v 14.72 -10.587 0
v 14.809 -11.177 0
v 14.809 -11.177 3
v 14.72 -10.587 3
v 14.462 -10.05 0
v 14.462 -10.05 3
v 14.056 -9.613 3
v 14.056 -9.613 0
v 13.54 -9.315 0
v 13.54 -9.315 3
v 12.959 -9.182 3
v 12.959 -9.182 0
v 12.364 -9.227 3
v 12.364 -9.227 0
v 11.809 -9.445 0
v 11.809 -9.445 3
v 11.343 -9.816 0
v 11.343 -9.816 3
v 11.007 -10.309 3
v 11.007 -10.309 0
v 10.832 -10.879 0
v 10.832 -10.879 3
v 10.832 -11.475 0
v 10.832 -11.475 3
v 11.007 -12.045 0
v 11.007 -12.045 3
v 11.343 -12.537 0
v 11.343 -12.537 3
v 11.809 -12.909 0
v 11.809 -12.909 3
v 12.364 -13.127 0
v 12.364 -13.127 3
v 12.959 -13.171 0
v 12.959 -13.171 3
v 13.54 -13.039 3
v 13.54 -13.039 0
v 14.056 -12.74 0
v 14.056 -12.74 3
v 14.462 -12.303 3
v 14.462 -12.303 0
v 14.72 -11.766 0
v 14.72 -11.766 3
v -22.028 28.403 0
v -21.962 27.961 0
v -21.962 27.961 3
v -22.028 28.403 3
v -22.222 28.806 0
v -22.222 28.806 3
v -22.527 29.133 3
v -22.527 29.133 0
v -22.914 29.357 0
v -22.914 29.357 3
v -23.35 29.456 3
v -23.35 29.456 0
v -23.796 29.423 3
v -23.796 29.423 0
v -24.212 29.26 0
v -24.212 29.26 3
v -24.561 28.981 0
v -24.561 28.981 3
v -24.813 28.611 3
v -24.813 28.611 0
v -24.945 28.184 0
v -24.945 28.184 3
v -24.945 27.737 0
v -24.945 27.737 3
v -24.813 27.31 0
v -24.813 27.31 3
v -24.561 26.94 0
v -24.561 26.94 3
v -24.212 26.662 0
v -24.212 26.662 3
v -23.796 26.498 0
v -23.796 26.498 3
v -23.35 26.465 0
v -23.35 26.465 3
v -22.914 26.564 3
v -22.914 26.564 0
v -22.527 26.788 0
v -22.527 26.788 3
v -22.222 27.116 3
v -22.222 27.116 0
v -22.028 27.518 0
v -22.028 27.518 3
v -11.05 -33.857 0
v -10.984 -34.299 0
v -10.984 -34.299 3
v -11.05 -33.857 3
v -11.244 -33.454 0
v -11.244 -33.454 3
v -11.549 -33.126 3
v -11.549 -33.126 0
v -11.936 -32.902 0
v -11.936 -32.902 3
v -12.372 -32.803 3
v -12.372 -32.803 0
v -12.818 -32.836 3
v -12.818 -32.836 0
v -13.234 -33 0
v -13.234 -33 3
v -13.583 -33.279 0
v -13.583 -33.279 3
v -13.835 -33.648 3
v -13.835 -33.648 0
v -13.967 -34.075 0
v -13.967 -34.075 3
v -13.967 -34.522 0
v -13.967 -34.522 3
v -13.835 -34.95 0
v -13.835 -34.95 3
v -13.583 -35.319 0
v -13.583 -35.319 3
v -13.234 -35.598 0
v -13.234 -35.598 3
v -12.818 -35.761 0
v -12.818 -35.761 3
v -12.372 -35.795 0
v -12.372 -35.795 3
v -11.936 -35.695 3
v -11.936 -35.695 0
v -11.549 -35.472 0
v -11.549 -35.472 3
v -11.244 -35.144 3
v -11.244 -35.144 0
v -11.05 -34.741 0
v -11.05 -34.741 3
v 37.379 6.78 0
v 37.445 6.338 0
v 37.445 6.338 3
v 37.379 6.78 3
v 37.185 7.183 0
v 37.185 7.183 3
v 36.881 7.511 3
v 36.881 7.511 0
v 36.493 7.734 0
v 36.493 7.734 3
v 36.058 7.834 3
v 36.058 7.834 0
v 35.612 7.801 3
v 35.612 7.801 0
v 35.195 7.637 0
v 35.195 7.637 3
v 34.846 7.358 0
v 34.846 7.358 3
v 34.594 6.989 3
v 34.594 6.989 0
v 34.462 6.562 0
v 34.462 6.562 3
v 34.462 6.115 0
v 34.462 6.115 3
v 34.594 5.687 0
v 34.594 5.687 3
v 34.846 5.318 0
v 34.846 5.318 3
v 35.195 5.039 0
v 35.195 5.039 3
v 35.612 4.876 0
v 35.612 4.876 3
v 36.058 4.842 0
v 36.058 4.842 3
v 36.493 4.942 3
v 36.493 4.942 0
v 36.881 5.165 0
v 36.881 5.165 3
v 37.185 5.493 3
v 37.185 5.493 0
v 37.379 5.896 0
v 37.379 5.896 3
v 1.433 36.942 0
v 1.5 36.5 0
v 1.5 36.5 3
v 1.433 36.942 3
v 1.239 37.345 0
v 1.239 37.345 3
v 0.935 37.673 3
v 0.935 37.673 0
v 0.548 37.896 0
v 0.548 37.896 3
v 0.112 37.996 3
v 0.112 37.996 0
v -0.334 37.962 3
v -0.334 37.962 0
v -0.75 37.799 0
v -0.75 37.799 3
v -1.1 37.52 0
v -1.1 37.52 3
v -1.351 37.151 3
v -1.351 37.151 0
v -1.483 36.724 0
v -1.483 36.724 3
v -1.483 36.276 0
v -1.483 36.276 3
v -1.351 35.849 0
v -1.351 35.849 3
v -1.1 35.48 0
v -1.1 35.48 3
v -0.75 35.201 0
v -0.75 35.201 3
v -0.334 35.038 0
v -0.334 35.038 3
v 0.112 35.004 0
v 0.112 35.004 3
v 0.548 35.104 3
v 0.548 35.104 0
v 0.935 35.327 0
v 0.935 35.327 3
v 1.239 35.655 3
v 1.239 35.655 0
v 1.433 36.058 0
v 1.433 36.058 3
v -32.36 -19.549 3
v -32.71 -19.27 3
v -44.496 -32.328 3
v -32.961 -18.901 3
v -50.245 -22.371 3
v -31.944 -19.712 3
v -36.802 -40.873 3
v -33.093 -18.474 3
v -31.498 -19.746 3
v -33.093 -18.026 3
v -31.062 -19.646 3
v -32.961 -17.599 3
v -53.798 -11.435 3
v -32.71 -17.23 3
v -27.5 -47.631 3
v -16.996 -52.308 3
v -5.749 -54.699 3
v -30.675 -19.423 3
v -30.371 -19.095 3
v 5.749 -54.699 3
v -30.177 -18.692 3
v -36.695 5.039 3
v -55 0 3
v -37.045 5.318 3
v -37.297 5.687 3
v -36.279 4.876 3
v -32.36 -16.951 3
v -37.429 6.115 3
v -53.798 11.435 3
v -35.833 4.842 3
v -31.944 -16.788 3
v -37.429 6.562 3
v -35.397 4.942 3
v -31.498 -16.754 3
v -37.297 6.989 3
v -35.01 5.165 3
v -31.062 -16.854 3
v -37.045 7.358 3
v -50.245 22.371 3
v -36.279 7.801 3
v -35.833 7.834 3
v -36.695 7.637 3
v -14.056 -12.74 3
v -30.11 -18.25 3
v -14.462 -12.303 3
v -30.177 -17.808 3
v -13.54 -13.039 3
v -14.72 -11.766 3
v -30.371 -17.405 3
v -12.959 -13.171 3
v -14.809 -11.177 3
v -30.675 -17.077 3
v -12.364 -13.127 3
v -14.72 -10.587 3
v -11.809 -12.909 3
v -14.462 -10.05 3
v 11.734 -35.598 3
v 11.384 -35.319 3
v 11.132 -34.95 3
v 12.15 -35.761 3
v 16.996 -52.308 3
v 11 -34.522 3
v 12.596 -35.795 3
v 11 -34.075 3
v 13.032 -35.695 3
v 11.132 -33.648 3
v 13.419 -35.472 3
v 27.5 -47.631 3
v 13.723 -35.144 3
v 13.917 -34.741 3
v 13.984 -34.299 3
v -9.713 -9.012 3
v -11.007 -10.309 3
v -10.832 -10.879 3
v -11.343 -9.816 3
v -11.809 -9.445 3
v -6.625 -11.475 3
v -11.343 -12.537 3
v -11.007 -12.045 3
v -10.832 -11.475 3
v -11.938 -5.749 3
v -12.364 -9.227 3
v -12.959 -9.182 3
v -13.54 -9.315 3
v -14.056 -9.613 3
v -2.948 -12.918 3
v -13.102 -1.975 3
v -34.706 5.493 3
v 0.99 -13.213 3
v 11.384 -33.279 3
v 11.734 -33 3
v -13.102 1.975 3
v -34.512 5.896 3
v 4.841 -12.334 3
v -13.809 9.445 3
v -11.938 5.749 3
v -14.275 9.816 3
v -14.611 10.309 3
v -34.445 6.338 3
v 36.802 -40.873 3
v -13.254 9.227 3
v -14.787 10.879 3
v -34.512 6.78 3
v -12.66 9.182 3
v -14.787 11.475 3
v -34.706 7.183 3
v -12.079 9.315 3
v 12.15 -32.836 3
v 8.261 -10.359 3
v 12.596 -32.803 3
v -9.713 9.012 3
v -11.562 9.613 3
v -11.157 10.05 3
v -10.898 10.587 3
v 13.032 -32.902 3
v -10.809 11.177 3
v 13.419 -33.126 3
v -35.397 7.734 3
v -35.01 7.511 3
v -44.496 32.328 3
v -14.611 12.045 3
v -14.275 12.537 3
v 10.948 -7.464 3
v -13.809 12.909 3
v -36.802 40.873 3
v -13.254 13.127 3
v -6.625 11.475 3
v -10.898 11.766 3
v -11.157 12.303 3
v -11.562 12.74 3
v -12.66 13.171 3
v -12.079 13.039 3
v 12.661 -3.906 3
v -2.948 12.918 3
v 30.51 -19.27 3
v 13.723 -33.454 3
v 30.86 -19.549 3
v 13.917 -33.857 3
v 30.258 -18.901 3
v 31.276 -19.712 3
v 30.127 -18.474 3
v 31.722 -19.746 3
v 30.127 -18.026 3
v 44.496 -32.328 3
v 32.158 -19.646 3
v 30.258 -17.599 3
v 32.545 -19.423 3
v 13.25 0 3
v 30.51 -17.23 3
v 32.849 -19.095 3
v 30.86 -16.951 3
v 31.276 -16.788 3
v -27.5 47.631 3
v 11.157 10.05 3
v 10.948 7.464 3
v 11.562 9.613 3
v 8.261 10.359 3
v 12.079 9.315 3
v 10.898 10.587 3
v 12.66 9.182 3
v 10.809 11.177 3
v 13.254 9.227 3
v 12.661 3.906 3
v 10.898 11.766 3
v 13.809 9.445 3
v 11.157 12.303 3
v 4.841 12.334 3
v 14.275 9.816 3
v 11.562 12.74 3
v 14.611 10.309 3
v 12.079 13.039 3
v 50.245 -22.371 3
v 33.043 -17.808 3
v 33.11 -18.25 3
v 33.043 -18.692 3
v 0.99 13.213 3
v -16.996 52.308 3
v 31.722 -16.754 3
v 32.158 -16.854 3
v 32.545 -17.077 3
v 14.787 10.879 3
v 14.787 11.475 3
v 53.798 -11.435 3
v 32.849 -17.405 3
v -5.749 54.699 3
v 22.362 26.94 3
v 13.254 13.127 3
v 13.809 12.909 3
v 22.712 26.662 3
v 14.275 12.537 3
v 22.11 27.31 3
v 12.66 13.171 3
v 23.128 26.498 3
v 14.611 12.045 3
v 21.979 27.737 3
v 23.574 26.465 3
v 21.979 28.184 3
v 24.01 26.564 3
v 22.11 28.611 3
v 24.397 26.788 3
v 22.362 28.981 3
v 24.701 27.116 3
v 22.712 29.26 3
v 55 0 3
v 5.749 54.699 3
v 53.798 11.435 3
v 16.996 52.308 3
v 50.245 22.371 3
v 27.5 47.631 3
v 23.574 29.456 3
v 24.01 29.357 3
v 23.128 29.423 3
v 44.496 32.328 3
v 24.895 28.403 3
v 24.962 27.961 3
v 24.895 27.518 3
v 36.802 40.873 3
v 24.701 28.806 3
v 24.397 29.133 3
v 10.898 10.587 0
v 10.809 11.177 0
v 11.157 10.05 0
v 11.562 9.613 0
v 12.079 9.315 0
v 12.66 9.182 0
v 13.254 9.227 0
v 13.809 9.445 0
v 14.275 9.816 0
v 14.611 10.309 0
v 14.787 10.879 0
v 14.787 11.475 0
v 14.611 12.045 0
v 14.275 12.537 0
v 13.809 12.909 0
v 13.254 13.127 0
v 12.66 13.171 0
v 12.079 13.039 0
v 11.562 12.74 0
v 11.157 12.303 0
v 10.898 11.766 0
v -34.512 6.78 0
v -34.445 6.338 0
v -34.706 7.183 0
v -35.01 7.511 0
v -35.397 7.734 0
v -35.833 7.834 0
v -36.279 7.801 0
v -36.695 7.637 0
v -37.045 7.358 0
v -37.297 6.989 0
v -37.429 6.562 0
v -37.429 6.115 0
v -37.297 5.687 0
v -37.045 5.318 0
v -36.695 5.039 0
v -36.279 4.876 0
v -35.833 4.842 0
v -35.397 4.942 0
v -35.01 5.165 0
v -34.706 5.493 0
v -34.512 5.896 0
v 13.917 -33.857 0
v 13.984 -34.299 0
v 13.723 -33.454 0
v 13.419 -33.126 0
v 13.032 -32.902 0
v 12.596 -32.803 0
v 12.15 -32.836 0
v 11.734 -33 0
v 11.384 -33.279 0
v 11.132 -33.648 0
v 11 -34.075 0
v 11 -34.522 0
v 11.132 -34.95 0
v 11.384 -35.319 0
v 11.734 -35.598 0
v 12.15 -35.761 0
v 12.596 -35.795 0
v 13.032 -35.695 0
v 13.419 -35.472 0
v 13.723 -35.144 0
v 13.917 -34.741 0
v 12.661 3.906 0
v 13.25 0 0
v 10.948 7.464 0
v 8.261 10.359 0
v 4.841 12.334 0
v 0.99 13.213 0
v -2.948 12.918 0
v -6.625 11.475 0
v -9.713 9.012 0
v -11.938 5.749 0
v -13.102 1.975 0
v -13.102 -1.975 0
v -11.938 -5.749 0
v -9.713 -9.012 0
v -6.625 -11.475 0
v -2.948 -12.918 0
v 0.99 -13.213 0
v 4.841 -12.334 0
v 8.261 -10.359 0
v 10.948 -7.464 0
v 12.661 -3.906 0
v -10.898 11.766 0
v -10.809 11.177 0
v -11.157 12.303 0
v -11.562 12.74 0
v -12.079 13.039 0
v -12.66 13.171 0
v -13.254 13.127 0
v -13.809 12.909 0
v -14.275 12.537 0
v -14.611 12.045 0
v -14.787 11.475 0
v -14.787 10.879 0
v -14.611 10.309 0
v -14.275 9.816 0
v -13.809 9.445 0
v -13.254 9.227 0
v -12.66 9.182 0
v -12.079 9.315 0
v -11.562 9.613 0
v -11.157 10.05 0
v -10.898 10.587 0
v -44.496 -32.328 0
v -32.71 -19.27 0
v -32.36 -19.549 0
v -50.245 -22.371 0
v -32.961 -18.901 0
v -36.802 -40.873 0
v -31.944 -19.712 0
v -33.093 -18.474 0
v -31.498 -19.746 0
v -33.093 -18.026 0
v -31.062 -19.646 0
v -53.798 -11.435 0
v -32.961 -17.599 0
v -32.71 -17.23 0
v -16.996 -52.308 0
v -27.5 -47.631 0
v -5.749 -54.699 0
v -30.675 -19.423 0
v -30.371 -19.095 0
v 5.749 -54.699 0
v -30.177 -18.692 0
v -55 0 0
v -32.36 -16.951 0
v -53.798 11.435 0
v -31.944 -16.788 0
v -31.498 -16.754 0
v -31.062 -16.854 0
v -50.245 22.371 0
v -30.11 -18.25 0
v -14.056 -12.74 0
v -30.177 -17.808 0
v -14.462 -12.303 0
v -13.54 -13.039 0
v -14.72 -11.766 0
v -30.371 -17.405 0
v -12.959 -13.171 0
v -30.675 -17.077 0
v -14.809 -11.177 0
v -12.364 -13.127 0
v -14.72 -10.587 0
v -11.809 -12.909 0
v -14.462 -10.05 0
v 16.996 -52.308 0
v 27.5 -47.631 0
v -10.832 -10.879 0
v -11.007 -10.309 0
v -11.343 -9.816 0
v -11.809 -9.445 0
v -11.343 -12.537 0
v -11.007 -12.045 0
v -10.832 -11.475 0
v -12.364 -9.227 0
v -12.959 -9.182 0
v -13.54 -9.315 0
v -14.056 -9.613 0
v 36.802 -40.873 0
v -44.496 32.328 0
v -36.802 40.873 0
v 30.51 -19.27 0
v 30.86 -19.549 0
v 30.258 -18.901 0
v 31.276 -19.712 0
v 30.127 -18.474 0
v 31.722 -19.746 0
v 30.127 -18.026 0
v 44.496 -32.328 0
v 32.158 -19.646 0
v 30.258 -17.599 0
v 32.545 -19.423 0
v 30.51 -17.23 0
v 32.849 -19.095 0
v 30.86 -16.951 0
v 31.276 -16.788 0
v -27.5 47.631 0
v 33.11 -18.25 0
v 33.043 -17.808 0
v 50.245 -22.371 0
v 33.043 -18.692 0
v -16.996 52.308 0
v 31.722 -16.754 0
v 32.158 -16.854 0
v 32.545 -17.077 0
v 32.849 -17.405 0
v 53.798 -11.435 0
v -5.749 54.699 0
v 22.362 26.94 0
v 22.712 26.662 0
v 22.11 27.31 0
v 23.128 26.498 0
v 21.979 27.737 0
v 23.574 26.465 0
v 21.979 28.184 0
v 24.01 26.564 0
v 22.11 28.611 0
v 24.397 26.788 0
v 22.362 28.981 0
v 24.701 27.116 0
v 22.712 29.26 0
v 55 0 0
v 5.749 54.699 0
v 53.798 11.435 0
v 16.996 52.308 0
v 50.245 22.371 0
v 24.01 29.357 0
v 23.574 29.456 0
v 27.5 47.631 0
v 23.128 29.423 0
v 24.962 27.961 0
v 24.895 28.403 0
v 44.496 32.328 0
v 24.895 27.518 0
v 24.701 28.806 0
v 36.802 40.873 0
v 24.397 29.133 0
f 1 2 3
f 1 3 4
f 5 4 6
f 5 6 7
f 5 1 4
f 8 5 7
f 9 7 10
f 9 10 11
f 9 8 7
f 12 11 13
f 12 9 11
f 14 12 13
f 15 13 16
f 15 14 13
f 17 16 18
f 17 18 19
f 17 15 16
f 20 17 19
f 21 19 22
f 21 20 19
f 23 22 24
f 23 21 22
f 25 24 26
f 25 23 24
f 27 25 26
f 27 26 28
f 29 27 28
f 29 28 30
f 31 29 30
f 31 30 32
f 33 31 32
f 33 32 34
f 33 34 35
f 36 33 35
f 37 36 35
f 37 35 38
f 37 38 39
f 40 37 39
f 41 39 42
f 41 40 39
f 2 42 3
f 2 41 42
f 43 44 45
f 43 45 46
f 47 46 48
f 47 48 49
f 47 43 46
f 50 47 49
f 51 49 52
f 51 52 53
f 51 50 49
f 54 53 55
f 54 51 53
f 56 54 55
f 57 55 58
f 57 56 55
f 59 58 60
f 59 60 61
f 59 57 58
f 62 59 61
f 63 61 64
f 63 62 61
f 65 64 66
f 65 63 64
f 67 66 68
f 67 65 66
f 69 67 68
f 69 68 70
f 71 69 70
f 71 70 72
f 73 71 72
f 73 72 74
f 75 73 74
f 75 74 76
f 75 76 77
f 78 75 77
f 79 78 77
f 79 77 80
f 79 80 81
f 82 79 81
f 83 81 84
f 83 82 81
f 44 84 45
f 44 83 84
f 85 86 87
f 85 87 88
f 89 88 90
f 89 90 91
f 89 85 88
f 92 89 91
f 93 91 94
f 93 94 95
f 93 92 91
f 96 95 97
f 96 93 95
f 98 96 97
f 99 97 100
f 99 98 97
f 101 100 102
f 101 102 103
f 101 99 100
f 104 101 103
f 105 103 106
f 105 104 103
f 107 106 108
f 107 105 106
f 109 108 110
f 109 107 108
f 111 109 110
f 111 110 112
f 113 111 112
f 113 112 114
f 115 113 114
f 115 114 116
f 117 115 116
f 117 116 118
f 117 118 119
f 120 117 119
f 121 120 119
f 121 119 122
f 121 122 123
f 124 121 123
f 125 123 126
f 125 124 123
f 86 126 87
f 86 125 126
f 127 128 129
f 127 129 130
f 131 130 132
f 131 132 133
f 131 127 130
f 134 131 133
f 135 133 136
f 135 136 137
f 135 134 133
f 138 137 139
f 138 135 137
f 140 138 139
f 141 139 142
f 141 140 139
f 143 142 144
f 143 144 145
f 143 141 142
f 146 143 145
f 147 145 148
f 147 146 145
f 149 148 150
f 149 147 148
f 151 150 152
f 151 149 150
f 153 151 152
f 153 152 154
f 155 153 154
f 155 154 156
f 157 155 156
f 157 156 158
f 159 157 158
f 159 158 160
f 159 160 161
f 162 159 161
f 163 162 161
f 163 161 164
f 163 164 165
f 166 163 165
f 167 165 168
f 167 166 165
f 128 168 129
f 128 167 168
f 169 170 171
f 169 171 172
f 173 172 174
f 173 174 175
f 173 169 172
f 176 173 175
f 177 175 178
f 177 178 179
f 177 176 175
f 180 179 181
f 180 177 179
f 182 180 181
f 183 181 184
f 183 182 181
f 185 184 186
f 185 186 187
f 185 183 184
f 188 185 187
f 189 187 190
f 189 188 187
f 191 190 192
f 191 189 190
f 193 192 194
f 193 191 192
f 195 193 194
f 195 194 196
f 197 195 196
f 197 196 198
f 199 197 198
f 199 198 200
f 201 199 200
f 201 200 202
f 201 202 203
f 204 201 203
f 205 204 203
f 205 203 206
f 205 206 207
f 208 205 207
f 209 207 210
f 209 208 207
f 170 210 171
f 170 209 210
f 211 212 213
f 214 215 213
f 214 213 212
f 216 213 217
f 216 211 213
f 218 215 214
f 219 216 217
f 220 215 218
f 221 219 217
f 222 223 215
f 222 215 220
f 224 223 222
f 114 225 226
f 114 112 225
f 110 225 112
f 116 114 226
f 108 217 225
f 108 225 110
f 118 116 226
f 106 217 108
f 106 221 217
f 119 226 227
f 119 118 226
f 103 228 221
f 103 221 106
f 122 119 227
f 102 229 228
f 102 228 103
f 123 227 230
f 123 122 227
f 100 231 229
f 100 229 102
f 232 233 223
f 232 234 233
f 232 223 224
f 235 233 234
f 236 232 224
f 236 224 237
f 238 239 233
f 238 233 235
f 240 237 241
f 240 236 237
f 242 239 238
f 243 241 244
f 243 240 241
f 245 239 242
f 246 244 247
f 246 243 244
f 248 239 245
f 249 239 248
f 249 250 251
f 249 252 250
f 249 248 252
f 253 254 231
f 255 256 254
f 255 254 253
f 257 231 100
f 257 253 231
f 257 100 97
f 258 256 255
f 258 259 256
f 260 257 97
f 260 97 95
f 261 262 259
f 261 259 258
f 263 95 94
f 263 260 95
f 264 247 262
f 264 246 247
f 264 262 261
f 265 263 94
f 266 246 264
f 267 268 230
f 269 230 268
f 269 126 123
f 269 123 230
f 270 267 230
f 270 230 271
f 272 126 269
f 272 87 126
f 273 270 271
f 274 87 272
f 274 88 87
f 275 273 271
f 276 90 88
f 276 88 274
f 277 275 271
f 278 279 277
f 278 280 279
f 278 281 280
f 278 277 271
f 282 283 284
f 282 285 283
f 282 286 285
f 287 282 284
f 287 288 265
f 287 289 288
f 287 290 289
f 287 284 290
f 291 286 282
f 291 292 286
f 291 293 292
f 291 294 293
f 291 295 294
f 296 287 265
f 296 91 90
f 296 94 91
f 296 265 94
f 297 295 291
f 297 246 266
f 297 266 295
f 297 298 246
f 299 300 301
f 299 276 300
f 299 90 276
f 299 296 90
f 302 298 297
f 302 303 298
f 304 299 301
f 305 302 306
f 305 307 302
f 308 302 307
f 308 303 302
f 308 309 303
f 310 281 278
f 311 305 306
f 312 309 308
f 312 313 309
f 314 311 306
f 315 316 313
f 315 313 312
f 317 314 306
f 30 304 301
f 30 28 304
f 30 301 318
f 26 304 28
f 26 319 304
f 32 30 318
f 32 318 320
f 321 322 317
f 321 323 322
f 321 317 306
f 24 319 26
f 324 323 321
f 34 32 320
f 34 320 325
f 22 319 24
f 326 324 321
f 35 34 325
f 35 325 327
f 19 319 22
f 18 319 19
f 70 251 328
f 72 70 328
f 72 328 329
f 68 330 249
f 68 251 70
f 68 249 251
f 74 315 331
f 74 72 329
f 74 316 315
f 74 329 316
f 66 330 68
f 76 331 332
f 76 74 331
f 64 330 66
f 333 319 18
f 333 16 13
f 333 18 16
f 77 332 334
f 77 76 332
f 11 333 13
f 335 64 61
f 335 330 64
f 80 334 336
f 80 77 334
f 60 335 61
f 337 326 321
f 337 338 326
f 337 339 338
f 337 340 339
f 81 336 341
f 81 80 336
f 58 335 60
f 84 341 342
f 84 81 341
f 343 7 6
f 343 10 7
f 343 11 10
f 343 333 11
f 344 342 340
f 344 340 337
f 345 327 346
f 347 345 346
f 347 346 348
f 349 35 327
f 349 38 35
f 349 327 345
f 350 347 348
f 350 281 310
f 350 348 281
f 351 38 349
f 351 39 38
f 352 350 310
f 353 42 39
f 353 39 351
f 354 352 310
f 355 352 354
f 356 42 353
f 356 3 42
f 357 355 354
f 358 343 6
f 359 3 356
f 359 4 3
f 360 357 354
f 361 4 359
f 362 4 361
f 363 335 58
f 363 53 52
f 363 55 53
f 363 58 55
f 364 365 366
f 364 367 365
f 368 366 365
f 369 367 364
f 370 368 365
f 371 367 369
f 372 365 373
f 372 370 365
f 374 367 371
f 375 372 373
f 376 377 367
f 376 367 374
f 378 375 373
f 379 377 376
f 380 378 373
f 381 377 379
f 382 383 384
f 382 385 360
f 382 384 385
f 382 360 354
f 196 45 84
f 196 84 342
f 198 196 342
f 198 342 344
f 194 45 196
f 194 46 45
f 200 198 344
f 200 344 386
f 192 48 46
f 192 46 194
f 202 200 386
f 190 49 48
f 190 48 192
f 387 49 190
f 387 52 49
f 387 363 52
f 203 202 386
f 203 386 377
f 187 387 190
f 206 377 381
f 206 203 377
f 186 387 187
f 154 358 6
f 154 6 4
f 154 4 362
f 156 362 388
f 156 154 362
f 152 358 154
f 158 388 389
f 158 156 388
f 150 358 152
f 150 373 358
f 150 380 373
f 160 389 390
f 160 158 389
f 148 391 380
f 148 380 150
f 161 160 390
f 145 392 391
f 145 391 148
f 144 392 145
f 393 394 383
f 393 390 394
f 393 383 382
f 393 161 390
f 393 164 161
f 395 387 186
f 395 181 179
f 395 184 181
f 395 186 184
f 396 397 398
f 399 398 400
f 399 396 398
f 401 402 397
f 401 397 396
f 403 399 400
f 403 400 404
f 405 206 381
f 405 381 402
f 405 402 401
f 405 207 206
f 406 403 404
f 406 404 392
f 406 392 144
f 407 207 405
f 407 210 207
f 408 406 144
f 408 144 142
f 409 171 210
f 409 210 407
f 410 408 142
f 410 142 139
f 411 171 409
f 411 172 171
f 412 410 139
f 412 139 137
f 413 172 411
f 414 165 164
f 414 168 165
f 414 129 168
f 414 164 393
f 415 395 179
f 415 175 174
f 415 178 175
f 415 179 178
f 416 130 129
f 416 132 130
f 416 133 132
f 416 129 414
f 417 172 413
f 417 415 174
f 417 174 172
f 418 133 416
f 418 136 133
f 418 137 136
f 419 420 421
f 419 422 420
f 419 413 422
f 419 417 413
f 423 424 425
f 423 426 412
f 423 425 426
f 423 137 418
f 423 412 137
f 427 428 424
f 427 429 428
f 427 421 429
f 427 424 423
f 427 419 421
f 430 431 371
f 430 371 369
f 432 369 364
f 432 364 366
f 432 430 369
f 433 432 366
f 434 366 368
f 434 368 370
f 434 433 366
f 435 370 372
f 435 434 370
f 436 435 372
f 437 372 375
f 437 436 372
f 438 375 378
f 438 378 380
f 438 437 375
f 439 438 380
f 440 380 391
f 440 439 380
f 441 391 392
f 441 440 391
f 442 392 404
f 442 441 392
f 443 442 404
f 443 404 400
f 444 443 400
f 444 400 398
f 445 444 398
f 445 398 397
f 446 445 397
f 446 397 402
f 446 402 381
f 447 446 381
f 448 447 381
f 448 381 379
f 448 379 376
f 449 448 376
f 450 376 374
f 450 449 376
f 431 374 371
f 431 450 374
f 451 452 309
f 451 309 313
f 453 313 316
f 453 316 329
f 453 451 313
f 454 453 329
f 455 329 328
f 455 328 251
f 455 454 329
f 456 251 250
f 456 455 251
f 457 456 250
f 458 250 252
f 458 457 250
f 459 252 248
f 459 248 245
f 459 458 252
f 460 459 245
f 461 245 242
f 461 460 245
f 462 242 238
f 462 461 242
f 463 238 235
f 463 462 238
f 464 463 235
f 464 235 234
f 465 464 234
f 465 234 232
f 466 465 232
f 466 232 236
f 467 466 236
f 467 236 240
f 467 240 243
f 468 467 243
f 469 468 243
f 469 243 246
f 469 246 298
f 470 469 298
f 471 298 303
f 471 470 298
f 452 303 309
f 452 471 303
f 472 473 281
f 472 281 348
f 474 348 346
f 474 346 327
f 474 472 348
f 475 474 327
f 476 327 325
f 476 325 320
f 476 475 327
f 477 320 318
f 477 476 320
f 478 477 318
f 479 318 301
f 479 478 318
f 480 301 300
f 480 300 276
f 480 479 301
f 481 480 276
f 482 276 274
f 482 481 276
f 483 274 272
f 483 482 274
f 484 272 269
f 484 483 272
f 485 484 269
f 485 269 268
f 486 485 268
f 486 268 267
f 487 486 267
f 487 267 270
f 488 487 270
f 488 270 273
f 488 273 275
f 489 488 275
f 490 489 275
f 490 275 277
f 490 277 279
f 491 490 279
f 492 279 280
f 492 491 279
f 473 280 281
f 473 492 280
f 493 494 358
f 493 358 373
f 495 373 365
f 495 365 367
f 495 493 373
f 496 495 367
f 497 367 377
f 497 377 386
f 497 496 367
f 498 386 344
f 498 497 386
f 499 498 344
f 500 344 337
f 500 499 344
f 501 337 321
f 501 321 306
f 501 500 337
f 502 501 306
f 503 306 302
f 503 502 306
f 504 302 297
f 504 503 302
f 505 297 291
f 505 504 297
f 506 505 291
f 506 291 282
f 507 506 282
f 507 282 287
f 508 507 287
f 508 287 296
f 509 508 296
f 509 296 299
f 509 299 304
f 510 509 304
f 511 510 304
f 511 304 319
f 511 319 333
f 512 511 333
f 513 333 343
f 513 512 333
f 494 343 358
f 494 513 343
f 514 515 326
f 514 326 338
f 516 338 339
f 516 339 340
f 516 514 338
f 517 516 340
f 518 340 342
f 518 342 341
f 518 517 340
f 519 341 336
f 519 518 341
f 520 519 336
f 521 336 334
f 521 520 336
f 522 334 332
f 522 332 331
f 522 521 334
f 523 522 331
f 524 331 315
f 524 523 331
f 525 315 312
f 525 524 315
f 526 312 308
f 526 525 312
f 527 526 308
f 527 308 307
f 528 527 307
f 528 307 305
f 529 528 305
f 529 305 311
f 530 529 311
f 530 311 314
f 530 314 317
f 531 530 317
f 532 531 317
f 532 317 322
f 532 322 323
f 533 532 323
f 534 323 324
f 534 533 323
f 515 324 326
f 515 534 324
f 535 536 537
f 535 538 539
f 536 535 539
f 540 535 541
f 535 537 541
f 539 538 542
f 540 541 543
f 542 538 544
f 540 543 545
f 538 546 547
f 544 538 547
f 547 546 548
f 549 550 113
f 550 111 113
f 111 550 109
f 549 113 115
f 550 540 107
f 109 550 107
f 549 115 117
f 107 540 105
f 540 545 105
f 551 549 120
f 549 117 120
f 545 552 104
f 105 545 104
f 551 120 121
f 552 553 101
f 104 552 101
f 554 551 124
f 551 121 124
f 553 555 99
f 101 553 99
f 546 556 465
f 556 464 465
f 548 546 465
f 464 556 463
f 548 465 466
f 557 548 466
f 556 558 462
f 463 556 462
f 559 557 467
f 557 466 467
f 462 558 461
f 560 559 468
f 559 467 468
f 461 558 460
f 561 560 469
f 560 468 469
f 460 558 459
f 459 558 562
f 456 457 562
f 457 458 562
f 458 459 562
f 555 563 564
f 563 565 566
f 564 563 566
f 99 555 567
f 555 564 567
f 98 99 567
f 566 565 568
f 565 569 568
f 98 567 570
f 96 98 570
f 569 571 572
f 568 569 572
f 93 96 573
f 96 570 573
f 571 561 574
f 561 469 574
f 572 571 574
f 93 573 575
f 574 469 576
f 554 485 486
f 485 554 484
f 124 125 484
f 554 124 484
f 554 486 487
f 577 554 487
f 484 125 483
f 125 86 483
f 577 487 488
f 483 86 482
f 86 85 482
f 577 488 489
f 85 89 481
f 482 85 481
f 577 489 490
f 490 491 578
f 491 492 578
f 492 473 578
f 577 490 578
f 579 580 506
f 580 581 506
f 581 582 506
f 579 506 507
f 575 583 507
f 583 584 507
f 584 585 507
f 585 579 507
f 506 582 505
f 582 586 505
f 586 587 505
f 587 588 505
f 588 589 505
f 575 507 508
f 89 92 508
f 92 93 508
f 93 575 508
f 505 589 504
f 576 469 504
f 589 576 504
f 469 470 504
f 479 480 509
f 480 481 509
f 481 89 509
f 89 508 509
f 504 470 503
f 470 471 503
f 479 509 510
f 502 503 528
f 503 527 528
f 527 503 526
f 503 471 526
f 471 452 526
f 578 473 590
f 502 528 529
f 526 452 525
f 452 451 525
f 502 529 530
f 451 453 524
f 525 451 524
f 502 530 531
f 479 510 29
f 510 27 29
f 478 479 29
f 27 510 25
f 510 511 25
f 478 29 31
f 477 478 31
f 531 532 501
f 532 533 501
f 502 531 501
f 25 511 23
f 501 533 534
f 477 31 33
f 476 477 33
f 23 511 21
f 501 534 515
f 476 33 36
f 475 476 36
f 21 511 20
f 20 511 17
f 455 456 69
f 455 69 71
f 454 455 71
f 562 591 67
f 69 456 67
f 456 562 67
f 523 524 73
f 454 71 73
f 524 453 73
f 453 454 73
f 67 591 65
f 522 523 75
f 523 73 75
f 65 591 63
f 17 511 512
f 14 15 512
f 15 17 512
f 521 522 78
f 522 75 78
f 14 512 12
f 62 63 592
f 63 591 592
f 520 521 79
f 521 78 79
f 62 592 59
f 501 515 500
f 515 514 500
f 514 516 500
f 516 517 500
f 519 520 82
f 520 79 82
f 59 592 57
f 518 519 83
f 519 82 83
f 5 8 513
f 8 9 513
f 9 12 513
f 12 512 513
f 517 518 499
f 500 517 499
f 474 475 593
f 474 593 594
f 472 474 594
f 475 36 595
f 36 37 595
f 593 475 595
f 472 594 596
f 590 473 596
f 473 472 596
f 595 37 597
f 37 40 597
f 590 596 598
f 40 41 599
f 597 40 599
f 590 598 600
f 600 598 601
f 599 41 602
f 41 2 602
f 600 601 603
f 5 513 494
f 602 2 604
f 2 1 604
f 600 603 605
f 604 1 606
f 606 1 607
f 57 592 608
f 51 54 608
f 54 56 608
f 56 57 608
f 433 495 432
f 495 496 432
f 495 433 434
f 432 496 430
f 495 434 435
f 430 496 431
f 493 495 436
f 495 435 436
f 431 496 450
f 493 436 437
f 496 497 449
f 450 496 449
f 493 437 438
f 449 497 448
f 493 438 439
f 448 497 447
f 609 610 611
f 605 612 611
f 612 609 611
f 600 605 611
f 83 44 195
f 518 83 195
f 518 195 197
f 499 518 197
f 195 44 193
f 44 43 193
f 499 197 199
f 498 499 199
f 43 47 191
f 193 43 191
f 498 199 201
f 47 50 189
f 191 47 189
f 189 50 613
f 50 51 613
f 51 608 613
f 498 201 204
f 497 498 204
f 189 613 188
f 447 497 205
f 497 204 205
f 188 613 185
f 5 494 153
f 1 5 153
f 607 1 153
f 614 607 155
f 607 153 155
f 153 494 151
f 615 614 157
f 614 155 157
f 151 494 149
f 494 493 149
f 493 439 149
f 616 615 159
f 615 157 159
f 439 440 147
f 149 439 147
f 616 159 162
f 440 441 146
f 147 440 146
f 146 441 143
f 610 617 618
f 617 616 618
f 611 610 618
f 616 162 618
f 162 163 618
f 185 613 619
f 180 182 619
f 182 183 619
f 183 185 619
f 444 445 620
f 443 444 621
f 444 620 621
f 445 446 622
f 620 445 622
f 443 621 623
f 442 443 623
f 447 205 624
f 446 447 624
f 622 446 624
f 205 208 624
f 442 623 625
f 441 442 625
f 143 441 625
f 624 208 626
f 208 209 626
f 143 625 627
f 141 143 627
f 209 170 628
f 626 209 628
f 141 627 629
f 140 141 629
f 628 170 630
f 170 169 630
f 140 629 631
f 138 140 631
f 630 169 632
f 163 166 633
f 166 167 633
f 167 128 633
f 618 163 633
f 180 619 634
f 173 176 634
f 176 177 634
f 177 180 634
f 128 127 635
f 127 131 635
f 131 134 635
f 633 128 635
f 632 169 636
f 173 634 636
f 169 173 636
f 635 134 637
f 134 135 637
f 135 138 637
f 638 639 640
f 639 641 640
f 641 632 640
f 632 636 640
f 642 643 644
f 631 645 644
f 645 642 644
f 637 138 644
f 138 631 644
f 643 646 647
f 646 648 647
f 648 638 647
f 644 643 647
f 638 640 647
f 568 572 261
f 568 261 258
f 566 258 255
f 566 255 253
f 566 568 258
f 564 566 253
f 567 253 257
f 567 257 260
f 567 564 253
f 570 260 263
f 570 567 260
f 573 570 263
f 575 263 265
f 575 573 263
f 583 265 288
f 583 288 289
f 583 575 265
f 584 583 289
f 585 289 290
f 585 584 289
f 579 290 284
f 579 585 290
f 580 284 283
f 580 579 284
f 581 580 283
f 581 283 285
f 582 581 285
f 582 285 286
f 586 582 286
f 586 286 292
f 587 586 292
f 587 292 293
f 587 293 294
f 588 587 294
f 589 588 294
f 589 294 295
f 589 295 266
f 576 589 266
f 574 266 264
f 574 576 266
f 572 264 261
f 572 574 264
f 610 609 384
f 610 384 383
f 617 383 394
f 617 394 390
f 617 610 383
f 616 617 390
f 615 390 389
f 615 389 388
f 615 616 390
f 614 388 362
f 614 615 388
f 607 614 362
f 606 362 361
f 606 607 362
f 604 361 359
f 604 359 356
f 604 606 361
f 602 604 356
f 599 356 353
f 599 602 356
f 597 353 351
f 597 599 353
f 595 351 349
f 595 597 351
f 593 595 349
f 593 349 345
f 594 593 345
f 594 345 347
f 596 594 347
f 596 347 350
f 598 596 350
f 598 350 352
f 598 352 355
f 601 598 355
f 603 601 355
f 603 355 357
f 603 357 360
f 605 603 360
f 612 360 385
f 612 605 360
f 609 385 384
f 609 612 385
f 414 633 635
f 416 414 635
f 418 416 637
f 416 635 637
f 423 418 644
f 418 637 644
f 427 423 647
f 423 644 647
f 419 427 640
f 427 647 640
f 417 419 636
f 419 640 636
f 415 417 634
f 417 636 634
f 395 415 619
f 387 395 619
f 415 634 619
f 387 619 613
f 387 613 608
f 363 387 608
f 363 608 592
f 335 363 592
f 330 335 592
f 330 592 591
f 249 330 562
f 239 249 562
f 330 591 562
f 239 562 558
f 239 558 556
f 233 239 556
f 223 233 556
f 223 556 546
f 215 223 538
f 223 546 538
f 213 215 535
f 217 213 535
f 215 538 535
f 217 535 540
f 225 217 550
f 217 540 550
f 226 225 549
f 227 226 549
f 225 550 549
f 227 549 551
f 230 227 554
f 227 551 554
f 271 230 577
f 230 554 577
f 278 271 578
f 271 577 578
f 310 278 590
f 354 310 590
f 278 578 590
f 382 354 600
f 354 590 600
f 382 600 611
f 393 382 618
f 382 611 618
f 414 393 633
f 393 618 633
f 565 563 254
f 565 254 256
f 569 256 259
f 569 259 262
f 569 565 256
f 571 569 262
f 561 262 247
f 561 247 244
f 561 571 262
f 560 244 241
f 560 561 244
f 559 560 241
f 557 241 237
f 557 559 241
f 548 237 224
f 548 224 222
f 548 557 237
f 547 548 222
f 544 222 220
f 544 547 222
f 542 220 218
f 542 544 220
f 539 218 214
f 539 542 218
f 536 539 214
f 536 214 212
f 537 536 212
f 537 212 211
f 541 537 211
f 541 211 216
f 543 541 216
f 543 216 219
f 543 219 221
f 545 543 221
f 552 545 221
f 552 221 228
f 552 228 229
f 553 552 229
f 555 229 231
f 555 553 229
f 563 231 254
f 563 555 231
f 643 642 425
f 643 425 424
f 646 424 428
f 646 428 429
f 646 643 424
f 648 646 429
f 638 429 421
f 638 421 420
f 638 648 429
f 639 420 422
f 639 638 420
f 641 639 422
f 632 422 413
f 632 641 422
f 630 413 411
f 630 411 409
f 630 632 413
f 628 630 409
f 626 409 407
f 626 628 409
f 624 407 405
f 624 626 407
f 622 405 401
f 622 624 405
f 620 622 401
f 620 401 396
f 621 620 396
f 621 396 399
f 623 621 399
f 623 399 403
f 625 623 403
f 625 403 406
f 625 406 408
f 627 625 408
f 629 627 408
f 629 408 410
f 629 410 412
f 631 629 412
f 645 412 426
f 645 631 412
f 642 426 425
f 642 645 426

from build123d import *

# Parameters (mm, degrees)
SKETCH_1_R      = 55
SKETCH_1_R_2    = 1.5
SKETCH_1_R_3    = 13.25
SKETCH_1_R_4    = 2
EXTRUDE_1_DEPTH = 3


with BuildPart() as part:
    # 草图1 → 凸台-拉伸1 (new body)
    with BuildSketch(Plane.XY):
        Circle(SKETCH_1_R)
        with Locations((0, 36.5)):
            Circle(SKETCH_1_R_2, mode=Mode.SUBTRACT)
        with Locations((23.461747754, 27.960622174)):
            Circle(SKETCH_1_R_2, mode=Mode.SUBTRACT)
        with Locations((35.945482985, 6.338158485)):
            Circle(SKETCH_1_R_2, mode=Mode.SUBTRACT)
        with Locations((31.609927238, -18.25)):
            Circle(SKETCH_1_R_2, mode=Mode.SUBTRACT)
        with Locations((12.483735231, -34.298780659)):
            Circle(SKETCH_1_R_2, mode=Mode.SUBTRACT)
        with Locations((-12.483735231, -34.298780659)):
            Circle(SKETCH_1_R_2, mode=Mode.SUBTRACT)
        with Locations((-31.609927238, -18.25)):
            Circle(SKETCH_1_R_2, mode=Mode.SUBTRACT)
        with Locations((-35.945482985, 6.338158485)):
            Circle(SKETCH_1_R_2, mode=Mode.SUBTRACT)
        with Locations((-23.461747754, 27.960622174)):
            Circle(SKETCH_1_R_2, mode=Mode.SUBTRACT)
        Circle(SKETCH_1_R_3, mode=Mode.SUBTRACT)
        with Locations((-12.809350268, 11.176786018)):
            Circle(SKETCH_1_R_4, mode=Mode.SUBTRACT)
        with Locations(Location((12.809350268, 11.176786018, 0), (0, 0, 180))):
            Circle(SKETCH_1_R_4, mode=Mode.SUBTRACT)
        with Locations((12.809350268, -11.176786018)):
            Circle(SKETCH_1_R_4, mode=Mode.SUBTRACT)
        with Locations(Location((-12.809350268, -11.176786018, 0), (0, 0, 180))):
            Circle(SKETCH_1_R_4, mode=Mode.SUBTRACT)
    extrude(amount=EXTRUDE_1_DEPTH)


solid = part.part
